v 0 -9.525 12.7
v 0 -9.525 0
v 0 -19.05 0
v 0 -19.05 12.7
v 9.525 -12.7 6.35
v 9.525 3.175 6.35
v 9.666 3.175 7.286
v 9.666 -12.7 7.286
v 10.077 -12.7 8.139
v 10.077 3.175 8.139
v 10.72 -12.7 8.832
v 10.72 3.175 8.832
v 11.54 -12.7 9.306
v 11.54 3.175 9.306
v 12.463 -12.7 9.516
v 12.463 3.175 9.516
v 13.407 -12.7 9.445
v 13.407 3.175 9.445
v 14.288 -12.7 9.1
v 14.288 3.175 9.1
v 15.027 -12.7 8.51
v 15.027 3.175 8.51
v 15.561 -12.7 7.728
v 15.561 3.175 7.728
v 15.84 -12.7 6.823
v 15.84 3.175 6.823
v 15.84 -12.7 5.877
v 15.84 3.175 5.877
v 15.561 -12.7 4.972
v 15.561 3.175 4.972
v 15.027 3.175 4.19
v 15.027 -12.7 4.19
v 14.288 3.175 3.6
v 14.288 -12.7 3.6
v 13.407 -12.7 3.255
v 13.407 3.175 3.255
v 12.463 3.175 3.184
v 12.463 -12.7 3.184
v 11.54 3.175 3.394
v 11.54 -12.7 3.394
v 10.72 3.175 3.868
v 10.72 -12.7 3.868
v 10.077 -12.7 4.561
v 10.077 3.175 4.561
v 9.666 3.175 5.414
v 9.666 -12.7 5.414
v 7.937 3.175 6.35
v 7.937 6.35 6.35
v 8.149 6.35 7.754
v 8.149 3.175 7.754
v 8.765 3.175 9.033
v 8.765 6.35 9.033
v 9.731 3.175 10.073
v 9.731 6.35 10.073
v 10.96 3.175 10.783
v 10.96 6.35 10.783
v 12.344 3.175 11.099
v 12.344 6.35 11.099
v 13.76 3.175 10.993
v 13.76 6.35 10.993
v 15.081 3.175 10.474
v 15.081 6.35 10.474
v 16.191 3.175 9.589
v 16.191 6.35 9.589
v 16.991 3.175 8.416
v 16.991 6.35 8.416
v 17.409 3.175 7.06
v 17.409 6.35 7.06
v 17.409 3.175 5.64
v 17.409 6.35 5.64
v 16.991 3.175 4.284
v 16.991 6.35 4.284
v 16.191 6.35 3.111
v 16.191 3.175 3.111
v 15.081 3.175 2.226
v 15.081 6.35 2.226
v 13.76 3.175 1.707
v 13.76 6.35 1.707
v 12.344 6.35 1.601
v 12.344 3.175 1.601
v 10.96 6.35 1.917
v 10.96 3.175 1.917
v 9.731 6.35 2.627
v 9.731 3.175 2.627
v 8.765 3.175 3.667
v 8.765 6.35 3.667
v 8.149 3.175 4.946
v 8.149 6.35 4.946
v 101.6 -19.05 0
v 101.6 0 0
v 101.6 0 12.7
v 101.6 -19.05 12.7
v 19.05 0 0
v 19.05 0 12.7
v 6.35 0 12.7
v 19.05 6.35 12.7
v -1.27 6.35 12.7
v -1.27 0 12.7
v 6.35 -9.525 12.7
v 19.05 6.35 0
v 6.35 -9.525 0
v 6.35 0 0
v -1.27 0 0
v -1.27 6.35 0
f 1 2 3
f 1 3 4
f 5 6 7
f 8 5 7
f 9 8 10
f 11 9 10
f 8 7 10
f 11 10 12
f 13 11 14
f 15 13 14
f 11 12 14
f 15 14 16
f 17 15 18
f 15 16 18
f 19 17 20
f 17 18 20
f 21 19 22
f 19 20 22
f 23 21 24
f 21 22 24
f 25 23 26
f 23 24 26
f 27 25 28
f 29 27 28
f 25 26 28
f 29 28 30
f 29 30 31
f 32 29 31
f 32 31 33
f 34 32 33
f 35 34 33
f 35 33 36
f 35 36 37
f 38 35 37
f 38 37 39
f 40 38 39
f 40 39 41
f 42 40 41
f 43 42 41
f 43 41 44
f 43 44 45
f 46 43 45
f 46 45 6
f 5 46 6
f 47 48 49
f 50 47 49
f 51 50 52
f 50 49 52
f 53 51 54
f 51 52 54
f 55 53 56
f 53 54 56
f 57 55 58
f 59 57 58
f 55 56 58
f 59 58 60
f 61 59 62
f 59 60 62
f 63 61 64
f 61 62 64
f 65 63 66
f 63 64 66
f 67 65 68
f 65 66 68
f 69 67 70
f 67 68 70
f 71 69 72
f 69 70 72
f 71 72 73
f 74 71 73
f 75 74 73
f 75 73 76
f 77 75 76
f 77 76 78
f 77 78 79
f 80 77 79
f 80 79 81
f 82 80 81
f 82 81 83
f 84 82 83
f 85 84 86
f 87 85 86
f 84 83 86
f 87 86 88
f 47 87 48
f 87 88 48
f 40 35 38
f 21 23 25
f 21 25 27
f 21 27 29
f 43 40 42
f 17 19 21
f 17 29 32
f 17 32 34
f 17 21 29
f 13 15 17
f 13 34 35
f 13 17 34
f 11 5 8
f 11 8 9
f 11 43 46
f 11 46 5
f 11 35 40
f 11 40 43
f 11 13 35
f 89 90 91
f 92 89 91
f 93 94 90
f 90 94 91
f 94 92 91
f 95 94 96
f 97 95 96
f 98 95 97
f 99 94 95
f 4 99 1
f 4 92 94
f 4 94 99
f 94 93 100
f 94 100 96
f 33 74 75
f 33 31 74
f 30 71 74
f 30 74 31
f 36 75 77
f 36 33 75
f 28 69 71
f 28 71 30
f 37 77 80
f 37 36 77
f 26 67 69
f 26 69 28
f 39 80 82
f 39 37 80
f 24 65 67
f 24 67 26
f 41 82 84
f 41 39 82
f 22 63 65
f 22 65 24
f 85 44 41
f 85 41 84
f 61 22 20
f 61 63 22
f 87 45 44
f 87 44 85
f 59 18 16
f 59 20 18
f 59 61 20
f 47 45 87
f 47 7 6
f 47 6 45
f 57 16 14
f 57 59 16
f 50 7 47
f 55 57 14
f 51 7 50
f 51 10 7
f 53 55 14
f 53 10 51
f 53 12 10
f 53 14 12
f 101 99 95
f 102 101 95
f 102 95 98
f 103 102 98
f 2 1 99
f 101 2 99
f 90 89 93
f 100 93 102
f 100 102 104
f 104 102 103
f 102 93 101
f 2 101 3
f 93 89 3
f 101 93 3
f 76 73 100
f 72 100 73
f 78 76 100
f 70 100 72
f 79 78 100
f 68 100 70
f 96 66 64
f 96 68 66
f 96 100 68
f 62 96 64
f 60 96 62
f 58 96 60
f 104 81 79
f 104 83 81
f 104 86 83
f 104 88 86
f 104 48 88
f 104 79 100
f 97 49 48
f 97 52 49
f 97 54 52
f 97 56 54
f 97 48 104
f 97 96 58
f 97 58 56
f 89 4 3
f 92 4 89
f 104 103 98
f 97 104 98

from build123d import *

# Parameters (mm, degrees)
F0_W      = 101.6
F0_H      = 12.7
F1_DEPTH  = 19.05
F2_W      = 6.35
F2_H      = 9.525
F3_DEPTH  = 25.4
F4_R      = 3.175
F6_DEPTH  = 12.7
F7_W      = 20.32
F7_H      = 12.7
F8_DEPTH  = 6.35
F9_R      = 4.7625
F9_R_2    = 3.175
F10_DEPTH = 3.175
F11_DEPTH = 6.35


with BuildPart() as f1:
    # F0 (on Front) → F1 (new body)
    with BuildSketch(Plane.XZ):
        with Locations((50.8, 6.35)):
            Rectangle(F0_W, F0_H)
    extrude(amount=F1_DEPTH)

    # F2 (on face) → F3 (cut)
    with BuildSketch(Plane.XY.offset(12.7)):
        with Locations((3.175, -4.7625)):
            Rectangle(F2_W, F2_H)
    extrude(amount=-F3_DEPTH, mode=Mode.SUBTRACT)

    # F4 (on face) → F6 (cut)
    with BuildSketch(Plane(origin=(0, 0, 0), x_dir=(-1, 0, 0), z_dir=(0, 1, 0))):
        with Locations((-12.7, 6.35)):
            Circle(F4_R)
    extrude(amount=-F6_DEPTH, mode=Mode.SUBTRACT)

    # F7 (on face) → F8 (join)
    with BuildSketch(Plane(origin=(0, 0, 0), x_dir=(-1, 0, 0), z_dir=(0, 1, 0))):
        with Locations((-8.89, 6.35)):
            Rectangle(F7_W, F7_H)
    extrude(amount=F8_DEPTH)

    # F9 (on face) → F10 (cut)
    with BuildSketch(Plane(origin=(0, 6.35, 0), x_dir=(-1, 0, 0), z_dir=(0, 1, 0))):
        with Locations((-12.7, 6.35)):
            Circle(F9_R)
        with Locations((-12.7, 6.35)):
            Circle(F9_R_2, mode=Mode.SUBTRACT)
    extrude(amount=-F10_DEPTH, mode=Mode.SUBTRACT)

    # F11 (cut): a face of the model
    f11_faces = [f1.faces().sort_by_distance(p)[0] for p in [
        (12.7, 6.35, 6.35),
    ]]
    extrude(f11_faces, amount=-F11_DEPTH, mode=Mode.SUBTRACT)


solid = f1.part
